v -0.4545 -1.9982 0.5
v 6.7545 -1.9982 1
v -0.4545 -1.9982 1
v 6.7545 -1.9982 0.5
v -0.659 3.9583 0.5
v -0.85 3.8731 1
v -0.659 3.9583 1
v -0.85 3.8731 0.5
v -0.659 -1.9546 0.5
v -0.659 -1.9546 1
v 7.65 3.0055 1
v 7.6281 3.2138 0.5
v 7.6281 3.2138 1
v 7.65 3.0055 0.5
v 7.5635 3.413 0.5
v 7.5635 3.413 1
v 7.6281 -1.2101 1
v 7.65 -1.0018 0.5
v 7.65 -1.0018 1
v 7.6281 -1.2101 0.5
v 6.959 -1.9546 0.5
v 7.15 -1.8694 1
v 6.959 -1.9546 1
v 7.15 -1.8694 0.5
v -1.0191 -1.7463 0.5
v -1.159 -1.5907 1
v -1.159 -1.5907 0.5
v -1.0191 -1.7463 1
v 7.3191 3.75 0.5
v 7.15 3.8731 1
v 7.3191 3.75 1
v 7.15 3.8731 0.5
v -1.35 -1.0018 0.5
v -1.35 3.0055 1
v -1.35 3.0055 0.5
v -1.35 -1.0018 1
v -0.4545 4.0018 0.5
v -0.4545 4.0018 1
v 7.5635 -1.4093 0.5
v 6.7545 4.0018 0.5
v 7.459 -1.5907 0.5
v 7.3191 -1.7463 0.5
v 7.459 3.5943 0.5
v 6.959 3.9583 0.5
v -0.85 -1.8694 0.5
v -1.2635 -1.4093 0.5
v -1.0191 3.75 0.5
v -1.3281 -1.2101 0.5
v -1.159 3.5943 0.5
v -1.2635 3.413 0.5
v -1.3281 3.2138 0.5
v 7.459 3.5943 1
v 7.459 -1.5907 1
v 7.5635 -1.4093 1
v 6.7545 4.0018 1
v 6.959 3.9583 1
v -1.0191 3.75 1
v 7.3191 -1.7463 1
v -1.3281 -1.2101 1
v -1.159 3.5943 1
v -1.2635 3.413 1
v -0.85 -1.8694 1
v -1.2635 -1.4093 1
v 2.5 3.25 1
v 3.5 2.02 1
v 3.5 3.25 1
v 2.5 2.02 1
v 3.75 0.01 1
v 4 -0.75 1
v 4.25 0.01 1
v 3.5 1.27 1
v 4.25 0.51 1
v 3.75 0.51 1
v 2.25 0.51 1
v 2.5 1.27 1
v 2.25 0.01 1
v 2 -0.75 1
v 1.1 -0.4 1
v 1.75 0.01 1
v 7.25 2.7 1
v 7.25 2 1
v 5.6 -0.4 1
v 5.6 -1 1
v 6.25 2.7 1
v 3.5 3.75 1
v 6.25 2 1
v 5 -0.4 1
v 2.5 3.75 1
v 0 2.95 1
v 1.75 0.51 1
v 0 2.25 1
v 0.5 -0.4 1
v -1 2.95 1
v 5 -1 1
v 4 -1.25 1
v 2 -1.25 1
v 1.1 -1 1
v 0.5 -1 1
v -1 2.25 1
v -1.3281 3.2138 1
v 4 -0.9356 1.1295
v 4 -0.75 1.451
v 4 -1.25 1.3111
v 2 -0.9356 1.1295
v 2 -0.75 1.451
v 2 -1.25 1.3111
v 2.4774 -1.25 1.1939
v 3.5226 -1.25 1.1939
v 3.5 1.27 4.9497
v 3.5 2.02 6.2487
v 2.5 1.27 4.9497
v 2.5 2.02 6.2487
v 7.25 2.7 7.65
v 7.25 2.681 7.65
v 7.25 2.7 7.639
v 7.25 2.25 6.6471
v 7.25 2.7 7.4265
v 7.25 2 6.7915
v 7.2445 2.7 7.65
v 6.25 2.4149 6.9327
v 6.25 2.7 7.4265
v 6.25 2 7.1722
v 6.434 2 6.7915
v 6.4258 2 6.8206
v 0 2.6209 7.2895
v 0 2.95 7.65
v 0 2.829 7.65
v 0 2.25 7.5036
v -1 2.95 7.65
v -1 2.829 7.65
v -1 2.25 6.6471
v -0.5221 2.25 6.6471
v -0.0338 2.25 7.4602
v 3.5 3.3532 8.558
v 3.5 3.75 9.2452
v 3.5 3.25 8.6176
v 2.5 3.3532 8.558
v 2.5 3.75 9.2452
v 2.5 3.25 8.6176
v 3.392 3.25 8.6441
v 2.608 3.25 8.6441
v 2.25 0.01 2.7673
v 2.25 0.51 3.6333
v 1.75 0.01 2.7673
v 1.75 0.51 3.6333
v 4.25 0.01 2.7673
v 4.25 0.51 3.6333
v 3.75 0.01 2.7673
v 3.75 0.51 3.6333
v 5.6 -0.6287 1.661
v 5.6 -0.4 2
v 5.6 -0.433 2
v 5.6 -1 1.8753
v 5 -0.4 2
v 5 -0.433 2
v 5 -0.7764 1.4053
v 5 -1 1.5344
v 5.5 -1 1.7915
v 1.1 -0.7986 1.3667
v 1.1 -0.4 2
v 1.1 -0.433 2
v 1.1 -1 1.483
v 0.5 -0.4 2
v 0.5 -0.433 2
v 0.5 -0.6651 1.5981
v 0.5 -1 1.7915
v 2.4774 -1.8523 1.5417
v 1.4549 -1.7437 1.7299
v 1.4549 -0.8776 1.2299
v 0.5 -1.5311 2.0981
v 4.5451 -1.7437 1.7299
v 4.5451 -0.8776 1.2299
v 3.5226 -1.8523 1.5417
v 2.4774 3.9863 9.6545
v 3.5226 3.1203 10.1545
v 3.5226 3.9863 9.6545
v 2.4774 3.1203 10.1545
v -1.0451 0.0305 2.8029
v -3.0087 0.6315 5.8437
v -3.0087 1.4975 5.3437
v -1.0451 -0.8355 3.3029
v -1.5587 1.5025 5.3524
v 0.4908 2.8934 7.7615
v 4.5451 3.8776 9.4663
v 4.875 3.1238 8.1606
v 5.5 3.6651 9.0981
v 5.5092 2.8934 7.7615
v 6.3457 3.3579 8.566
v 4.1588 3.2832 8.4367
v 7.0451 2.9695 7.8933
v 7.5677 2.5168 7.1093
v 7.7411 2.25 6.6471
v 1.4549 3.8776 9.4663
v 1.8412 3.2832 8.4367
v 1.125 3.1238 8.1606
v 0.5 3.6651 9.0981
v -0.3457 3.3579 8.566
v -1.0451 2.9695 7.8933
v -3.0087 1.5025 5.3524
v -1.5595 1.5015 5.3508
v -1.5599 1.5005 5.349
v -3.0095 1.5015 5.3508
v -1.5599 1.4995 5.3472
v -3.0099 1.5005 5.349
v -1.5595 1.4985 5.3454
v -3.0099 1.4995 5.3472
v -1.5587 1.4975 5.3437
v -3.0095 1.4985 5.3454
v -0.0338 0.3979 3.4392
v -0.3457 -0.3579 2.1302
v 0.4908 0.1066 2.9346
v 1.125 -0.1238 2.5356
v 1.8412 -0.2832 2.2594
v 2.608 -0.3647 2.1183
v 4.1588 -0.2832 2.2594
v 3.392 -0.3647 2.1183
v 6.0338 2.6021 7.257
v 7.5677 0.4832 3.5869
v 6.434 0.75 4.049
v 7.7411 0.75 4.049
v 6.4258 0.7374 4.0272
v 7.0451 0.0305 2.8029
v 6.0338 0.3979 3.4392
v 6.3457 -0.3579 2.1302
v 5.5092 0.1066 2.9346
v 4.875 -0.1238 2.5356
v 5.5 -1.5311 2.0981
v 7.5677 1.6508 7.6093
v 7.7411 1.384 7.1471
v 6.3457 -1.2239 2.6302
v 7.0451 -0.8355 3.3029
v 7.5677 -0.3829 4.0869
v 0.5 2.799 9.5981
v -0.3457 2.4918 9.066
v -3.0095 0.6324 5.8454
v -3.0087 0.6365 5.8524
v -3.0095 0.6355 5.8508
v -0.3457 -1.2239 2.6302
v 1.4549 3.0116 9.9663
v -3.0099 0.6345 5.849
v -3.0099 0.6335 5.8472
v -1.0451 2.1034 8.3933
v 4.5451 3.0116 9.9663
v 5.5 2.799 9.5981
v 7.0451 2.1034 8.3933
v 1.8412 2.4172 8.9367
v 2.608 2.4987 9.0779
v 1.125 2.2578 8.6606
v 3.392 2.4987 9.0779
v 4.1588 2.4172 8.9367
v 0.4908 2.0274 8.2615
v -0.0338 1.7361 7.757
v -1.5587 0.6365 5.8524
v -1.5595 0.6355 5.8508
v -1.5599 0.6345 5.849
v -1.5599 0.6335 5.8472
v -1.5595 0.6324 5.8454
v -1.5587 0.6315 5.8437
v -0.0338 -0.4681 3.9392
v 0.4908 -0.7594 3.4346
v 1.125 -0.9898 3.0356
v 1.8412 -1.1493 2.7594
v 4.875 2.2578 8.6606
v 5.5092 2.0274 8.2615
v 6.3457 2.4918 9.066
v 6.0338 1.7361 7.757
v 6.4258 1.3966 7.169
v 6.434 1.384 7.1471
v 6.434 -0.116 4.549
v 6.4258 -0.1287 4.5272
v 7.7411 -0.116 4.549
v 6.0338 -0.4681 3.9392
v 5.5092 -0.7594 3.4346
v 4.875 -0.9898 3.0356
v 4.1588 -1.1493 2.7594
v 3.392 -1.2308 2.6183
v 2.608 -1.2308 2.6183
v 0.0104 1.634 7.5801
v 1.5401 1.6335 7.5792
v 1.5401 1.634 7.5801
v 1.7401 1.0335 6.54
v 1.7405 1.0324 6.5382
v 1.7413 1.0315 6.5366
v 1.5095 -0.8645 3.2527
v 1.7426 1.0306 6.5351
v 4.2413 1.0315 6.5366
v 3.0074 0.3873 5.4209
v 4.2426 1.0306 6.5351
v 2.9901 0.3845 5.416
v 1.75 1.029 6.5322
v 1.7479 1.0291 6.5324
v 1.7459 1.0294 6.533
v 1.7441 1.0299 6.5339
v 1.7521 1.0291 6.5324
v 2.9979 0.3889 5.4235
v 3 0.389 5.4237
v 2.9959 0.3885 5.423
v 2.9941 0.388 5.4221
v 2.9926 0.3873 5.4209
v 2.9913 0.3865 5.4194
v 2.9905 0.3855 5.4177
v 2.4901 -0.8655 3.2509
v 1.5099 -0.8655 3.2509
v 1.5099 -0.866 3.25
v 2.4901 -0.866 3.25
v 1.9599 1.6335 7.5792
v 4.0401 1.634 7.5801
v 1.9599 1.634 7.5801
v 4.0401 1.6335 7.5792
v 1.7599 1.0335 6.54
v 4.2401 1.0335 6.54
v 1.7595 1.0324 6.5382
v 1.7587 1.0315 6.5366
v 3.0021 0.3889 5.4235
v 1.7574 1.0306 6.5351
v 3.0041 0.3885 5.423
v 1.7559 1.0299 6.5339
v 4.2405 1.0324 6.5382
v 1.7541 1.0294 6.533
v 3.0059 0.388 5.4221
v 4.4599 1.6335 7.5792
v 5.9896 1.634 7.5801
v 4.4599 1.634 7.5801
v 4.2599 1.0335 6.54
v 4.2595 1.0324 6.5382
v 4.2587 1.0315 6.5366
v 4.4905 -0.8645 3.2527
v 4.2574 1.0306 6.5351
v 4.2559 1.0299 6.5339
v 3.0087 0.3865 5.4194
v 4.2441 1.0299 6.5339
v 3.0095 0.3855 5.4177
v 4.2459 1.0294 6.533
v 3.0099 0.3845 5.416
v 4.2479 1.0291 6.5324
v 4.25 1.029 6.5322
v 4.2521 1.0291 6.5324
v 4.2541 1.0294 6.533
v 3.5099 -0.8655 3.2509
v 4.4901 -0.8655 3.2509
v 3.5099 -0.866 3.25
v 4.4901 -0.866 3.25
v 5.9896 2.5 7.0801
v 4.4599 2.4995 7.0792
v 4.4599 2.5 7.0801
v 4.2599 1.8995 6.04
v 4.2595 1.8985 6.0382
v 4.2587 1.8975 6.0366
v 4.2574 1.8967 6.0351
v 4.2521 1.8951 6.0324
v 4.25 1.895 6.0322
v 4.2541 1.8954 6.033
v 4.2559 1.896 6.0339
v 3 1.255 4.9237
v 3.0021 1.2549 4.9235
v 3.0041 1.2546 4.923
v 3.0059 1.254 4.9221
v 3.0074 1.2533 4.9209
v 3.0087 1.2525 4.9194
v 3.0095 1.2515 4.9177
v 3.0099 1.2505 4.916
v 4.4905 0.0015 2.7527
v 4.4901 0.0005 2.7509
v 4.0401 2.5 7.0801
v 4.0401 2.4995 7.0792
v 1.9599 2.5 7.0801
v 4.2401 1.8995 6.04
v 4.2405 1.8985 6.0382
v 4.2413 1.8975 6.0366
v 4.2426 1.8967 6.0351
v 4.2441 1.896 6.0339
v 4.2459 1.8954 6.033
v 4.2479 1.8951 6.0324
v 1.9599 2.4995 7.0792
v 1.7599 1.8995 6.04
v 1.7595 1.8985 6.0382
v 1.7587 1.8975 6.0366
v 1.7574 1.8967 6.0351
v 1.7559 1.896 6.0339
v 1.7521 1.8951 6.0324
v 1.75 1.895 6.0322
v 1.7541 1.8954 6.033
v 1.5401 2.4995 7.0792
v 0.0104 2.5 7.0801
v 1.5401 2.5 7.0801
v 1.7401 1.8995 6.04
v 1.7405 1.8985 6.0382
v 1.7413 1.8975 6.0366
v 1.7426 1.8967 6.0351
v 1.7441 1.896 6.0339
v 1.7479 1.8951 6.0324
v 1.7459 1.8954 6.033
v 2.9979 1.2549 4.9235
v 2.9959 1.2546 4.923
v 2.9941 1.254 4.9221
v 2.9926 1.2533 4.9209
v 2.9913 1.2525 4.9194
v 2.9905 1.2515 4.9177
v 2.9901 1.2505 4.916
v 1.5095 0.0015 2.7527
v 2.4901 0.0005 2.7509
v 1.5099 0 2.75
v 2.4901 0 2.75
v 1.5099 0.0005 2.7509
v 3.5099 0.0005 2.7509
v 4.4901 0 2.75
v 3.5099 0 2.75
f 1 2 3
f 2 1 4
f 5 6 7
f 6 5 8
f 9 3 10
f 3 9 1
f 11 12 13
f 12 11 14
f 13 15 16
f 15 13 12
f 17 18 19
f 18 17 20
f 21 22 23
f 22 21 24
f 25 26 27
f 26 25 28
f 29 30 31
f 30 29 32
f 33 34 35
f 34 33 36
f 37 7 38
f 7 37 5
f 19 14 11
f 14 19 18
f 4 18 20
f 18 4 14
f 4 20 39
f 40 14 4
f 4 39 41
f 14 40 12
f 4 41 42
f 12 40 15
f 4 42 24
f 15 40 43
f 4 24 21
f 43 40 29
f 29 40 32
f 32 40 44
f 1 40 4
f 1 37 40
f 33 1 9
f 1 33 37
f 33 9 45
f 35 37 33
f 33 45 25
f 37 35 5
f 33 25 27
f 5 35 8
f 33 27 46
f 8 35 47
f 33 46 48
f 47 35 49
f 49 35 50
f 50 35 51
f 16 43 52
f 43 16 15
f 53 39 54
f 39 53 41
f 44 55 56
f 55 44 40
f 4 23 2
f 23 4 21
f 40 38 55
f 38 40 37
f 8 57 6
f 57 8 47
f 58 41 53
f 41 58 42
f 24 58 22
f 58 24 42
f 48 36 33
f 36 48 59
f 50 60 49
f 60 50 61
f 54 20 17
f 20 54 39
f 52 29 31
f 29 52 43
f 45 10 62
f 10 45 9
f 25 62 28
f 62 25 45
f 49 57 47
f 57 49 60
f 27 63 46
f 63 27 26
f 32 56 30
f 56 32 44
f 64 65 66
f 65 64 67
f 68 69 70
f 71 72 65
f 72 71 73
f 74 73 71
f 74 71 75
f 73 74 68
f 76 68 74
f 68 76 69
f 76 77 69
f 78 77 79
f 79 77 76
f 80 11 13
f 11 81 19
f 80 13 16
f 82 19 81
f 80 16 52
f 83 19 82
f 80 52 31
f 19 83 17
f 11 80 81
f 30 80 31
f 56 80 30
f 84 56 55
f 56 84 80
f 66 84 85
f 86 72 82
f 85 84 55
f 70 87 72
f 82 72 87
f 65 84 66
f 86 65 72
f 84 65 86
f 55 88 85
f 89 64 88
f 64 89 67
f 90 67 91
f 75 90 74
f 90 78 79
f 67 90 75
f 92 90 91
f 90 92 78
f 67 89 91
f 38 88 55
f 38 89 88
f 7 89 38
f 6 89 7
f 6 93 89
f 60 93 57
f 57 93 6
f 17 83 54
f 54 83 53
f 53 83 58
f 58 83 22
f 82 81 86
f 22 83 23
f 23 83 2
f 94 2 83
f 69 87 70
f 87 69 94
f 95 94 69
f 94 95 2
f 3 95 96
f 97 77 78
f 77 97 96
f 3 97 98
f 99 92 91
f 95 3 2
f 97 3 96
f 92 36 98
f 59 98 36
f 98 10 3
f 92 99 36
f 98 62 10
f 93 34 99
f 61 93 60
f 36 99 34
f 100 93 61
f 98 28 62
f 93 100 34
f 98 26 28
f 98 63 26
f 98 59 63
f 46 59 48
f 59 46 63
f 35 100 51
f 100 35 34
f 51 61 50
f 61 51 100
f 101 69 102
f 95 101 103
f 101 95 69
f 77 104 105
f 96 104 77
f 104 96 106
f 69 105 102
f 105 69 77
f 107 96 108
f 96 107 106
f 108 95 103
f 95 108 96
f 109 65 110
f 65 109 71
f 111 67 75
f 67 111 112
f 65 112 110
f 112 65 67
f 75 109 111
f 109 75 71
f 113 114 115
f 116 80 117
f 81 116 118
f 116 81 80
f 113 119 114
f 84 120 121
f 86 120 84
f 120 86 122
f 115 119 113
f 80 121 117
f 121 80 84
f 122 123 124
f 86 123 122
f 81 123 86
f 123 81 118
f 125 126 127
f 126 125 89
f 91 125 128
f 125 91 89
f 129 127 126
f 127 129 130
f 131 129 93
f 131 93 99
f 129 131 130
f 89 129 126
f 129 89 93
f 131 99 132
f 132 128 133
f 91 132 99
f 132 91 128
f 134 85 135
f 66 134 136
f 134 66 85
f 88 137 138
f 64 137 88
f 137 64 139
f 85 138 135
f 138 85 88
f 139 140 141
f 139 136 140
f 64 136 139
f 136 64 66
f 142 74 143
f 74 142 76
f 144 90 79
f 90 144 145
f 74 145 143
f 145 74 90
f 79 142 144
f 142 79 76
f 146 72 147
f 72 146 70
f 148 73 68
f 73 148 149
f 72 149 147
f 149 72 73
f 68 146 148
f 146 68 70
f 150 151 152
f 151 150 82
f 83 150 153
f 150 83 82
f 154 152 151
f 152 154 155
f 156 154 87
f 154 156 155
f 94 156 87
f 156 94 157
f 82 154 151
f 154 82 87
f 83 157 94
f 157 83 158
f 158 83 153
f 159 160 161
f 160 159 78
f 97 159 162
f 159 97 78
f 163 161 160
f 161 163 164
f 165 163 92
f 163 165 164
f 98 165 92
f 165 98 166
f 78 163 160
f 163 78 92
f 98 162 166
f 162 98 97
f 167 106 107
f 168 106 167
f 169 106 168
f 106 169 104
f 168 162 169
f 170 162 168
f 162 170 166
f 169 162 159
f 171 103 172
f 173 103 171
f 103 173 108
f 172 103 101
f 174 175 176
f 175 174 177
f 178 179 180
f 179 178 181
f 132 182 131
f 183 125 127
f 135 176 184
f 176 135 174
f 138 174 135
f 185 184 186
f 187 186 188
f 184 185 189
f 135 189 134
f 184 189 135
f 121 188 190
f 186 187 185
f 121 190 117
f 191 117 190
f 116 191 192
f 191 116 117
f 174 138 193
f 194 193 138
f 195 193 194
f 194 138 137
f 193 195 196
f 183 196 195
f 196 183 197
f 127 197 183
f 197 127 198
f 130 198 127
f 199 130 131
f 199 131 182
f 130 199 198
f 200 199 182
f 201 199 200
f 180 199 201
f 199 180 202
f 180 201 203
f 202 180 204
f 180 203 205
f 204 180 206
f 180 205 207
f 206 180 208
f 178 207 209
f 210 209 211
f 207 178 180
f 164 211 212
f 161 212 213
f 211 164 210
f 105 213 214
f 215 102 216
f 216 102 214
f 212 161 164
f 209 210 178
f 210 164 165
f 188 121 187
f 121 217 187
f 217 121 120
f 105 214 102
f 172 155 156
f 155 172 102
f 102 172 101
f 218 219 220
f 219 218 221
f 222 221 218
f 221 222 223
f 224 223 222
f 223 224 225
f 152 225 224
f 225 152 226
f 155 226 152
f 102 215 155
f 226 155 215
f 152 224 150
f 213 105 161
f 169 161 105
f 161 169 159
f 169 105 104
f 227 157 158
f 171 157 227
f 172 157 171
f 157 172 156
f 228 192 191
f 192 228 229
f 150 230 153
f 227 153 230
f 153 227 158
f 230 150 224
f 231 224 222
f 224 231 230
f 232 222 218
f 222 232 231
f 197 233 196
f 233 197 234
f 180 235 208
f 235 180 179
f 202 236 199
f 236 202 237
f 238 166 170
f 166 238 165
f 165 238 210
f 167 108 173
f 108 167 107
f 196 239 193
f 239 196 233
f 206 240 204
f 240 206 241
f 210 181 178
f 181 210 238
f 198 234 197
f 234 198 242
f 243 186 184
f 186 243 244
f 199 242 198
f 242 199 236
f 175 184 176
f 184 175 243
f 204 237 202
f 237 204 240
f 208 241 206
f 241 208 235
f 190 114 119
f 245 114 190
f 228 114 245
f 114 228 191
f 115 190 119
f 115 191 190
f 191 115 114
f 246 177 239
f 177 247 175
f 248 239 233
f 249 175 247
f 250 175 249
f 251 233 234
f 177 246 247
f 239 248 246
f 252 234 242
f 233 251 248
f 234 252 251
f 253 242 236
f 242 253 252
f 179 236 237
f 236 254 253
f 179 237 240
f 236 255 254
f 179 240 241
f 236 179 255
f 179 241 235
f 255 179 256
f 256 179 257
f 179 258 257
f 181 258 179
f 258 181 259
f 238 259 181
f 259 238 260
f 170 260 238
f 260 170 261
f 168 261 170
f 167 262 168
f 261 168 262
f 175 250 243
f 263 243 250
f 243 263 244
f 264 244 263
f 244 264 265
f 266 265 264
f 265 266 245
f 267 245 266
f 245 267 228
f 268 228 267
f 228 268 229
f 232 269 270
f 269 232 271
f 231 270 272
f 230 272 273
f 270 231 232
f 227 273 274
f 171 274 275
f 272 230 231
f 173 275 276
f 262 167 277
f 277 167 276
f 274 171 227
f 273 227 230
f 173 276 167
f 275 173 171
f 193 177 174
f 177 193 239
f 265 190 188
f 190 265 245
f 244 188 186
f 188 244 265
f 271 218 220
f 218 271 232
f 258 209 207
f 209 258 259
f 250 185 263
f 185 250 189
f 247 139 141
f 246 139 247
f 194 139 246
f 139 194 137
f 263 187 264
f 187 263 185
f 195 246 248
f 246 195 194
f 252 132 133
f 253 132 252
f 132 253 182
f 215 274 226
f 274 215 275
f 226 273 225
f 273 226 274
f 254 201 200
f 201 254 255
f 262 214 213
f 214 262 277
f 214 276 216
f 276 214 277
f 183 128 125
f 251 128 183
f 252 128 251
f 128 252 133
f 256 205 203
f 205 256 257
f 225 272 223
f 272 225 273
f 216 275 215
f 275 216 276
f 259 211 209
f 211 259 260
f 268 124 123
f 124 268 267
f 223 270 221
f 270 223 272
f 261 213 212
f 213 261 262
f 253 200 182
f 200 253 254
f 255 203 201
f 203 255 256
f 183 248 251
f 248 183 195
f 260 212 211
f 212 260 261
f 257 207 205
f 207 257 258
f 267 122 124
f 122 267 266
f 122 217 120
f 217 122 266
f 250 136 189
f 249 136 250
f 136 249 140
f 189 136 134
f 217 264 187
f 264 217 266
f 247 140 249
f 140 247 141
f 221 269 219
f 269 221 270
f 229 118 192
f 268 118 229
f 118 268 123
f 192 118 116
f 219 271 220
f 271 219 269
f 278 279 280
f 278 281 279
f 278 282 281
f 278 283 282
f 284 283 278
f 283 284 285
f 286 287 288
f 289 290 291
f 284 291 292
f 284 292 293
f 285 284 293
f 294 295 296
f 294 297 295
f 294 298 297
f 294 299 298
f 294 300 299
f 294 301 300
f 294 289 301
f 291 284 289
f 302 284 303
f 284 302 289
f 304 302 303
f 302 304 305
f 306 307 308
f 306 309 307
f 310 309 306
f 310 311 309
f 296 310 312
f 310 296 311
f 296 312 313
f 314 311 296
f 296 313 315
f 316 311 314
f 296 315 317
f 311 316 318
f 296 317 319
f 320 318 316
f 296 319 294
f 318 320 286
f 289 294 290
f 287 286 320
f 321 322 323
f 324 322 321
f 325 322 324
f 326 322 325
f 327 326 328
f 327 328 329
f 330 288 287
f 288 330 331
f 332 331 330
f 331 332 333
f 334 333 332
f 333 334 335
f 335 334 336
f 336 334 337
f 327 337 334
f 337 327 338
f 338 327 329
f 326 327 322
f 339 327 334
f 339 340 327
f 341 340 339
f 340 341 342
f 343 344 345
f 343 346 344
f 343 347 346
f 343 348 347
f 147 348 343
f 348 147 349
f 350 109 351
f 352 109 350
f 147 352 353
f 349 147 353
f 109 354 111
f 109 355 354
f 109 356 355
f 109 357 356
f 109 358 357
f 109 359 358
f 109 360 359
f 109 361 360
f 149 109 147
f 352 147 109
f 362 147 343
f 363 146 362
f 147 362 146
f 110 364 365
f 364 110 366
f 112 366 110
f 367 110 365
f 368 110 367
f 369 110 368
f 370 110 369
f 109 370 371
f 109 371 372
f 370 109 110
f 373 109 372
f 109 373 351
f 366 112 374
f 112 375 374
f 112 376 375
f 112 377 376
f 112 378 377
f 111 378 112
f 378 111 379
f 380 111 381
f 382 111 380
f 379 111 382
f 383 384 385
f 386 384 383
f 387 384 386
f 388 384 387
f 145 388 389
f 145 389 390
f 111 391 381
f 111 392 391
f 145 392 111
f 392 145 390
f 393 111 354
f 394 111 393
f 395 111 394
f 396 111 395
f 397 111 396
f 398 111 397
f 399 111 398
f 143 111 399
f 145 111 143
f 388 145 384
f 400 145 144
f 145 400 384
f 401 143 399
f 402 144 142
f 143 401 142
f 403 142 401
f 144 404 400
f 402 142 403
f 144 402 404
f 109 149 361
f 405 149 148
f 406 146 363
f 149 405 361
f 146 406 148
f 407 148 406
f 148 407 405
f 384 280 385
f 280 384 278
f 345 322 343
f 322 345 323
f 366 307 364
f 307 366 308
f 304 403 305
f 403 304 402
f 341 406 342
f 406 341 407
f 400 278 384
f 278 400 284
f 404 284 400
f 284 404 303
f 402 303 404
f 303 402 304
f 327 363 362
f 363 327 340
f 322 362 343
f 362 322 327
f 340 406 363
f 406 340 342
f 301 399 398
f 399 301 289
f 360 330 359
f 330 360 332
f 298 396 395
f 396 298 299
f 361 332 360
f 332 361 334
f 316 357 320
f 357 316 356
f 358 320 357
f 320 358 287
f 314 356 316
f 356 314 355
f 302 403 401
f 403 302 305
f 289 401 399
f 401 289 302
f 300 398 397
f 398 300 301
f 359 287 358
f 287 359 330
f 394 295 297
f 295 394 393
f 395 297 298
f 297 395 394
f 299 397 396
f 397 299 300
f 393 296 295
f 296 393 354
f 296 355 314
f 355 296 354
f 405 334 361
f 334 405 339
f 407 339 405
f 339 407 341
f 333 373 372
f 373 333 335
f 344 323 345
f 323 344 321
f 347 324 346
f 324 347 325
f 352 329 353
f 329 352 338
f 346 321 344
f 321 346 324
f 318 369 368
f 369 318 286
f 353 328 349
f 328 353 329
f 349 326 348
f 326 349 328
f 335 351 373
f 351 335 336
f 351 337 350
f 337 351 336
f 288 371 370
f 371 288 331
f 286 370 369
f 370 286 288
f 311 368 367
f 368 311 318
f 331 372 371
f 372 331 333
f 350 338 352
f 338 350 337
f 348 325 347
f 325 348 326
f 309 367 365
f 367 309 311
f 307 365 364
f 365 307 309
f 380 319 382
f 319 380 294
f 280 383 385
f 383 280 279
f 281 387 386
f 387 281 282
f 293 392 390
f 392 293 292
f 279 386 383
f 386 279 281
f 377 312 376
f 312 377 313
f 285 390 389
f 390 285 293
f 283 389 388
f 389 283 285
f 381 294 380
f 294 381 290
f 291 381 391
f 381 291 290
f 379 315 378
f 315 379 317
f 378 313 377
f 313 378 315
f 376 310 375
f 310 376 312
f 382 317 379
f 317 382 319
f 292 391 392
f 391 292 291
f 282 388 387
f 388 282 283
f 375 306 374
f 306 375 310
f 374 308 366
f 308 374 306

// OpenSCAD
a =0;
f = 2.75;
//minimize the edge of a cylinder in order to generate triangle
minimumEdge = 0.01;
//merge 5 cubes+ logo together
union(){
union(){
union(){
//the base (biggest cube) using minkowski to create rounded corners
translate([0,0,0.5])resize([9,6,0.5]){
minkowski(){
//cube base
translate([-0.35,-1,a]) cube([7,4,0.01]);
// cylinder to merge with the cube base -> generate rounded corners
cylinder([1,1,0.01]);
}}
//first cube 
translate([2,-1.25,1])cube([2,0.5,0.5]);
translate([2.5,1.27,1])cube([1,0.75,5.5]);

}
//support the C
translate([6.25,2,1])cube([1,0.7,6.65]);
// support the curve
translate([-1,2.25,1])cube([1,0.7,6.65]);
//last cube
translate([2.5,3.25,1])cube([1,0.5,8.5]);

}
//right cube
translate([1.75,0.01,1])cube([0.5,0.5,3]);

//left cube
translate([3.75,0.01,1])cube([0.5,0.5,3]);
//two support cubes
translate([5,-1,1])cube([0.6,0.6,1]);
translate([0.5,-1,1])cube([0.6,0.6,1]);
}



// left triangle to merge with the bigger circle in order to create curves
module tri_left(where){
translate([where,3,0]){
rotate([0,0,90]){
triangle(1,1,minimumEdge,1);
mirror([1,0,0]) triangle(1,1,0.01,1);

}
}
}
//sub-surface
$fn = 30;
// bigger circle - smaller circle and move the centre -side cube
translate([0,0,f])
rotate ([60,0,0]){
    //  circles with curves - side cube = "C"
difference(){
    //substract two
difference(){
    // merge left trianlge with the circle
    hull(){
   translate([3,3,0]) {cylinder(r=5,h=1);}
   tri_left(-2);
   }
   //merge inside left triangle with the circle
   hull(){
   translate([3,3,0]) {cylinder(r=3.75,h=1);}
   tri_left(-0.55);
   }
}

// side cube to create the gap in "C"
translate([6,1.5,0]){cube([2.5,3,1]);}
}
}
//cube - triagle(origin) - triangle(non origin) - triangle(bottom) - triangle(top)
translate([0,0,f])
rotate([60,0,0]){
difference(){
difference(){
difference(){
difference(){
cube([6,5,1]);
  // rotate the right triangle 90 degree and mirror it
    mirror([1,0,0])rotate([0,0,90]){ triangle(5,1.5,minimumEdge,1);} 

}
// 2nd triangle (non-origin)
 translate([6,0,0])rotate([0,0,90]){ triangle(5,1.5,minimumEdge,1);} 
}
//call bottom triangle
bottom_triangle();
}
//for the top triangle
top_triangle();
}
}

// top triangles
module top_triangle(){
 //right one
gen_for_top(4.25);

//left one = the mirror of the right one with difference location
mirror([1,0,0])
gen_for_top(-1.75);
}

// function to generate top triangle
module gen_for_top(where){
    // move triangle around
 translate([where,5,0]) {
     // rotate the triangle -90 z 
rotate([0,0,-90]){ triangle(1.2,0.2,minimumEdge,1);}
//mirror the triangle
mirror([1,0,0])rotate([0,0,-90]){ triangle(1.2,0.2,minimumEdge,1);}
}
}

//bottom triangle
module bottom_triangle(){
translate([3,0,0]) {
    // rotate 90 degree z
rotate([0,0,90]){ triangle(2.5,0.5,minimumEdge,1);}
// mirror the triagle (the idea is that the bottom triangle is not right but it can be created by two right triangle)
mirror([1,0,0])rotate([0,0,90]){ triangle(2.5,0.5,minimumEdge,1);}
}
}
 
//generate right triangle
module triangle(a1,b1,r1,h1){
    // use hull o merge 3 cylinders 
 hull(){
     //create cylinder with radius r1 and height h1
     cylinder(r=r1,h=h1);
     // create the second triagle 
     translate([a1,0,0])cylinder(r=r1,h=h1);
      translate([0,b1,0])cylinder(r=r1,h=h1);
 }
 
   
}
